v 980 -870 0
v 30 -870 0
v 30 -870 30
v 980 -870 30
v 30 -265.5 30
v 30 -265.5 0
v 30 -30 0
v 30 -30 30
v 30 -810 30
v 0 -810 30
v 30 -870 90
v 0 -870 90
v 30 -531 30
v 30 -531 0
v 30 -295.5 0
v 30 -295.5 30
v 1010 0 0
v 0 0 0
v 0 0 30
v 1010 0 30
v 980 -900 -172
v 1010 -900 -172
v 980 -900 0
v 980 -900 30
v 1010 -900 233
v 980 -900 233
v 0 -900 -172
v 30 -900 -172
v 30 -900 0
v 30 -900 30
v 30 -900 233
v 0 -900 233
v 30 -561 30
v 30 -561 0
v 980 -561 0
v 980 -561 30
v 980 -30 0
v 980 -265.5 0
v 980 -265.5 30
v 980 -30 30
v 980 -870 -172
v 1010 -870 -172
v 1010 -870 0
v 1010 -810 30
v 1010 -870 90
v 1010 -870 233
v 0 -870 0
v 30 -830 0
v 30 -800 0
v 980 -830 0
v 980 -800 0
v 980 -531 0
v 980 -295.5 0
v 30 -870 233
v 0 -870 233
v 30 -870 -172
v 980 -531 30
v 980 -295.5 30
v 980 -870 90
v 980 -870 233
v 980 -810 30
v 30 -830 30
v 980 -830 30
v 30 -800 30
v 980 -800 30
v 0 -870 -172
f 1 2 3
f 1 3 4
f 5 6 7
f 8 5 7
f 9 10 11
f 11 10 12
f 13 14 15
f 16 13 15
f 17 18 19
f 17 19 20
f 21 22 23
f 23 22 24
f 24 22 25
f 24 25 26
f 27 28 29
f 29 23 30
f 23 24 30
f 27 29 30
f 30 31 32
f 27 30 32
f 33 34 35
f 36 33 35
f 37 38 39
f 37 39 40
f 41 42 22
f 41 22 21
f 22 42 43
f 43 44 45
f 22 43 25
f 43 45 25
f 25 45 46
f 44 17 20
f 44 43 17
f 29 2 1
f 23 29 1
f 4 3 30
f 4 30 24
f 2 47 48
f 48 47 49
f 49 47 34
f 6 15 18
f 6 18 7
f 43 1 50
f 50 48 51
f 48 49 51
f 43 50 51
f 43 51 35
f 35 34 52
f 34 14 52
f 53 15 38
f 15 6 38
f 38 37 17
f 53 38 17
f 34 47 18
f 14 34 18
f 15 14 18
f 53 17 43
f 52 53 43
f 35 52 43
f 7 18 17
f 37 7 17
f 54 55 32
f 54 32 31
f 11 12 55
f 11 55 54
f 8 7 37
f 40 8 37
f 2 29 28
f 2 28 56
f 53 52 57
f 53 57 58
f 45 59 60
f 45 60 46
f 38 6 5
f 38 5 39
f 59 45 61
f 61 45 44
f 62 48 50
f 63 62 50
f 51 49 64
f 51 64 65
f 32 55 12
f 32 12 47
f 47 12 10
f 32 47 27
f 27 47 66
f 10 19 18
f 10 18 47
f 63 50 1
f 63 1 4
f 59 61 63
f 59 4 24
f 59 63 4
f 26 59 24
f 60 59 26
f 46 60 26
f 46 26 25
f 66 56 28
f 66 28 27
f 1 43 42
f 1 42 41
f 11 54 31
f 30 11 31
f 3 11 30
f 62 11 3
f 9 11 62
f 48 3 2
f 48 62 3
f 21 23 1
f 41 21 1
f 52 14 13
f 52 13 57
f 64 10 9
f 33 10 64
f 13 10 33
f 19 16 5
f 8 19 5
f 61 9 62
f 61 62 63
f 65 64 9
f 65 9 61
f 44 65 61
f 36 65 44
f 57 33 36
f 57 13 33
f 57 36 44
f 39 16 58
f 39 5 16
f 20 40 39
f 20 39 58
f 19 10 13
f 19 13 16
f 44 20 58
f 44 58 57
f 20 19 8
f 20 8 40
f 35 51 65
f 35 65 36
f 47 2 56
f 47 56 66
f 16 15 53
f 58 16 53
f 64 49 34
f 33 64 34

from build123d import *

# Parameters (mm, degrees)
SKETCH1_W           = 1010
SKETCH1_H           = 900
SKETCH1_W_2         = 950
SKETCH1_H_2         = 840
SKETCH1_H_3         = 30
BOSS_EXTRUDE1_DEPTH = 30
SKETCH2_W           = 30
SKETCH2_H           = 30
BOSS_EXTRUDE2_DEPTH = 203
SKETCH3_W           = 30
SKETCH3_H           = 30
BOSS_EXTRUDE3_DEPTH = 172
BOSS_EXTRUDE4_DEPTH = 30
BOSS_EXTRUDE5_DEPTH = 30


with BuildPart() as part:
    # Sketch1 → Boss-Extrude1 (new body)
    # profile 1 of 4: a face of its own
    with BuildSketch(Plane.XY):
        with Locations((505, -450)):
            Rectangle(SKETCH1_W, SKETCH1_H)
        with Locations((505, -450)):
            Rectangle(SKETCH1_W_2, SKETCH1_H_2, mode=Mode.SUBTRACT)
    # profile 2 of 4: a face of its own
    with BuildSketch(Plane.XY):
        with Locations((505, -815)):
            Rectangle(SKETCH1_W_2, SKETCH1_H_3)
    # profile 3 of 4: a face of its own
    with BuildSketch(Plane.XY):
        with Locations((505, -546)):
            Rectangle(SKETCH1_W_2, SKETCH1_H_3)
    # profile 4 of 4: a face of its own
    with BuildSketch(Plane.XY):
        with Locations((505, -280.5)):
            Rectangle(SKETCH1_W_2, SKETCH1_H_3)
    extrude(amount=BOSS_EXTRUDE1_DEPTH)

    # Sketch2 → Boss-Extrude2 (add)
    with BuildSketch(Plane.XY.offset(30)):
        with Locations((15, -885)):
            Rectangle(SKETCH2_W, SKETCH2_H)
        with Locations((995, -885)):
            Rectangle(SKETCH2_W, SKETCH2_H)
    extrude(amount=BOSS_EXTRUDE2_DEPTH)

    # Sketch3 → Boss-Extrude3 (add)
    with BuildSketch(Plane(origin=(0, 0, 0), x_dir=(-1, 0, 0), z_dir=(0, 0, -1))):
        with Locations((-15, -885)):
            Rectangle(SKETCH3_W, SKETCH3_H)
        with Locations((-995, -885)):
            Rectangle(SKETCH3_W, SKETCH3_H)
    extrude(amount=BOSS_EXTRUDE3_DEPTH)

    # Sketch4 → Boss-Extrude4 (add)
    with BuildSketch(Plane.ZY):
        Polygon((30, -810), (90, -870), (30, -870), align=None)
    extrude(amount=-BOSS_EXTRUDE4_DEPTH)

    # Sketch5 → Boss-Extrude5 (add)
    with BuildSketch(Plane(origin=(1010, 0, 0), x_dir=(0, 0, -1), z_dir=(1, 0, 0))):
        Polygon((-30, -810), (-30, -870), (-90, -870), align=None)
    extrude(amount=-BOSS_EXTRUDE5_DEPTH)


solid = part.part
